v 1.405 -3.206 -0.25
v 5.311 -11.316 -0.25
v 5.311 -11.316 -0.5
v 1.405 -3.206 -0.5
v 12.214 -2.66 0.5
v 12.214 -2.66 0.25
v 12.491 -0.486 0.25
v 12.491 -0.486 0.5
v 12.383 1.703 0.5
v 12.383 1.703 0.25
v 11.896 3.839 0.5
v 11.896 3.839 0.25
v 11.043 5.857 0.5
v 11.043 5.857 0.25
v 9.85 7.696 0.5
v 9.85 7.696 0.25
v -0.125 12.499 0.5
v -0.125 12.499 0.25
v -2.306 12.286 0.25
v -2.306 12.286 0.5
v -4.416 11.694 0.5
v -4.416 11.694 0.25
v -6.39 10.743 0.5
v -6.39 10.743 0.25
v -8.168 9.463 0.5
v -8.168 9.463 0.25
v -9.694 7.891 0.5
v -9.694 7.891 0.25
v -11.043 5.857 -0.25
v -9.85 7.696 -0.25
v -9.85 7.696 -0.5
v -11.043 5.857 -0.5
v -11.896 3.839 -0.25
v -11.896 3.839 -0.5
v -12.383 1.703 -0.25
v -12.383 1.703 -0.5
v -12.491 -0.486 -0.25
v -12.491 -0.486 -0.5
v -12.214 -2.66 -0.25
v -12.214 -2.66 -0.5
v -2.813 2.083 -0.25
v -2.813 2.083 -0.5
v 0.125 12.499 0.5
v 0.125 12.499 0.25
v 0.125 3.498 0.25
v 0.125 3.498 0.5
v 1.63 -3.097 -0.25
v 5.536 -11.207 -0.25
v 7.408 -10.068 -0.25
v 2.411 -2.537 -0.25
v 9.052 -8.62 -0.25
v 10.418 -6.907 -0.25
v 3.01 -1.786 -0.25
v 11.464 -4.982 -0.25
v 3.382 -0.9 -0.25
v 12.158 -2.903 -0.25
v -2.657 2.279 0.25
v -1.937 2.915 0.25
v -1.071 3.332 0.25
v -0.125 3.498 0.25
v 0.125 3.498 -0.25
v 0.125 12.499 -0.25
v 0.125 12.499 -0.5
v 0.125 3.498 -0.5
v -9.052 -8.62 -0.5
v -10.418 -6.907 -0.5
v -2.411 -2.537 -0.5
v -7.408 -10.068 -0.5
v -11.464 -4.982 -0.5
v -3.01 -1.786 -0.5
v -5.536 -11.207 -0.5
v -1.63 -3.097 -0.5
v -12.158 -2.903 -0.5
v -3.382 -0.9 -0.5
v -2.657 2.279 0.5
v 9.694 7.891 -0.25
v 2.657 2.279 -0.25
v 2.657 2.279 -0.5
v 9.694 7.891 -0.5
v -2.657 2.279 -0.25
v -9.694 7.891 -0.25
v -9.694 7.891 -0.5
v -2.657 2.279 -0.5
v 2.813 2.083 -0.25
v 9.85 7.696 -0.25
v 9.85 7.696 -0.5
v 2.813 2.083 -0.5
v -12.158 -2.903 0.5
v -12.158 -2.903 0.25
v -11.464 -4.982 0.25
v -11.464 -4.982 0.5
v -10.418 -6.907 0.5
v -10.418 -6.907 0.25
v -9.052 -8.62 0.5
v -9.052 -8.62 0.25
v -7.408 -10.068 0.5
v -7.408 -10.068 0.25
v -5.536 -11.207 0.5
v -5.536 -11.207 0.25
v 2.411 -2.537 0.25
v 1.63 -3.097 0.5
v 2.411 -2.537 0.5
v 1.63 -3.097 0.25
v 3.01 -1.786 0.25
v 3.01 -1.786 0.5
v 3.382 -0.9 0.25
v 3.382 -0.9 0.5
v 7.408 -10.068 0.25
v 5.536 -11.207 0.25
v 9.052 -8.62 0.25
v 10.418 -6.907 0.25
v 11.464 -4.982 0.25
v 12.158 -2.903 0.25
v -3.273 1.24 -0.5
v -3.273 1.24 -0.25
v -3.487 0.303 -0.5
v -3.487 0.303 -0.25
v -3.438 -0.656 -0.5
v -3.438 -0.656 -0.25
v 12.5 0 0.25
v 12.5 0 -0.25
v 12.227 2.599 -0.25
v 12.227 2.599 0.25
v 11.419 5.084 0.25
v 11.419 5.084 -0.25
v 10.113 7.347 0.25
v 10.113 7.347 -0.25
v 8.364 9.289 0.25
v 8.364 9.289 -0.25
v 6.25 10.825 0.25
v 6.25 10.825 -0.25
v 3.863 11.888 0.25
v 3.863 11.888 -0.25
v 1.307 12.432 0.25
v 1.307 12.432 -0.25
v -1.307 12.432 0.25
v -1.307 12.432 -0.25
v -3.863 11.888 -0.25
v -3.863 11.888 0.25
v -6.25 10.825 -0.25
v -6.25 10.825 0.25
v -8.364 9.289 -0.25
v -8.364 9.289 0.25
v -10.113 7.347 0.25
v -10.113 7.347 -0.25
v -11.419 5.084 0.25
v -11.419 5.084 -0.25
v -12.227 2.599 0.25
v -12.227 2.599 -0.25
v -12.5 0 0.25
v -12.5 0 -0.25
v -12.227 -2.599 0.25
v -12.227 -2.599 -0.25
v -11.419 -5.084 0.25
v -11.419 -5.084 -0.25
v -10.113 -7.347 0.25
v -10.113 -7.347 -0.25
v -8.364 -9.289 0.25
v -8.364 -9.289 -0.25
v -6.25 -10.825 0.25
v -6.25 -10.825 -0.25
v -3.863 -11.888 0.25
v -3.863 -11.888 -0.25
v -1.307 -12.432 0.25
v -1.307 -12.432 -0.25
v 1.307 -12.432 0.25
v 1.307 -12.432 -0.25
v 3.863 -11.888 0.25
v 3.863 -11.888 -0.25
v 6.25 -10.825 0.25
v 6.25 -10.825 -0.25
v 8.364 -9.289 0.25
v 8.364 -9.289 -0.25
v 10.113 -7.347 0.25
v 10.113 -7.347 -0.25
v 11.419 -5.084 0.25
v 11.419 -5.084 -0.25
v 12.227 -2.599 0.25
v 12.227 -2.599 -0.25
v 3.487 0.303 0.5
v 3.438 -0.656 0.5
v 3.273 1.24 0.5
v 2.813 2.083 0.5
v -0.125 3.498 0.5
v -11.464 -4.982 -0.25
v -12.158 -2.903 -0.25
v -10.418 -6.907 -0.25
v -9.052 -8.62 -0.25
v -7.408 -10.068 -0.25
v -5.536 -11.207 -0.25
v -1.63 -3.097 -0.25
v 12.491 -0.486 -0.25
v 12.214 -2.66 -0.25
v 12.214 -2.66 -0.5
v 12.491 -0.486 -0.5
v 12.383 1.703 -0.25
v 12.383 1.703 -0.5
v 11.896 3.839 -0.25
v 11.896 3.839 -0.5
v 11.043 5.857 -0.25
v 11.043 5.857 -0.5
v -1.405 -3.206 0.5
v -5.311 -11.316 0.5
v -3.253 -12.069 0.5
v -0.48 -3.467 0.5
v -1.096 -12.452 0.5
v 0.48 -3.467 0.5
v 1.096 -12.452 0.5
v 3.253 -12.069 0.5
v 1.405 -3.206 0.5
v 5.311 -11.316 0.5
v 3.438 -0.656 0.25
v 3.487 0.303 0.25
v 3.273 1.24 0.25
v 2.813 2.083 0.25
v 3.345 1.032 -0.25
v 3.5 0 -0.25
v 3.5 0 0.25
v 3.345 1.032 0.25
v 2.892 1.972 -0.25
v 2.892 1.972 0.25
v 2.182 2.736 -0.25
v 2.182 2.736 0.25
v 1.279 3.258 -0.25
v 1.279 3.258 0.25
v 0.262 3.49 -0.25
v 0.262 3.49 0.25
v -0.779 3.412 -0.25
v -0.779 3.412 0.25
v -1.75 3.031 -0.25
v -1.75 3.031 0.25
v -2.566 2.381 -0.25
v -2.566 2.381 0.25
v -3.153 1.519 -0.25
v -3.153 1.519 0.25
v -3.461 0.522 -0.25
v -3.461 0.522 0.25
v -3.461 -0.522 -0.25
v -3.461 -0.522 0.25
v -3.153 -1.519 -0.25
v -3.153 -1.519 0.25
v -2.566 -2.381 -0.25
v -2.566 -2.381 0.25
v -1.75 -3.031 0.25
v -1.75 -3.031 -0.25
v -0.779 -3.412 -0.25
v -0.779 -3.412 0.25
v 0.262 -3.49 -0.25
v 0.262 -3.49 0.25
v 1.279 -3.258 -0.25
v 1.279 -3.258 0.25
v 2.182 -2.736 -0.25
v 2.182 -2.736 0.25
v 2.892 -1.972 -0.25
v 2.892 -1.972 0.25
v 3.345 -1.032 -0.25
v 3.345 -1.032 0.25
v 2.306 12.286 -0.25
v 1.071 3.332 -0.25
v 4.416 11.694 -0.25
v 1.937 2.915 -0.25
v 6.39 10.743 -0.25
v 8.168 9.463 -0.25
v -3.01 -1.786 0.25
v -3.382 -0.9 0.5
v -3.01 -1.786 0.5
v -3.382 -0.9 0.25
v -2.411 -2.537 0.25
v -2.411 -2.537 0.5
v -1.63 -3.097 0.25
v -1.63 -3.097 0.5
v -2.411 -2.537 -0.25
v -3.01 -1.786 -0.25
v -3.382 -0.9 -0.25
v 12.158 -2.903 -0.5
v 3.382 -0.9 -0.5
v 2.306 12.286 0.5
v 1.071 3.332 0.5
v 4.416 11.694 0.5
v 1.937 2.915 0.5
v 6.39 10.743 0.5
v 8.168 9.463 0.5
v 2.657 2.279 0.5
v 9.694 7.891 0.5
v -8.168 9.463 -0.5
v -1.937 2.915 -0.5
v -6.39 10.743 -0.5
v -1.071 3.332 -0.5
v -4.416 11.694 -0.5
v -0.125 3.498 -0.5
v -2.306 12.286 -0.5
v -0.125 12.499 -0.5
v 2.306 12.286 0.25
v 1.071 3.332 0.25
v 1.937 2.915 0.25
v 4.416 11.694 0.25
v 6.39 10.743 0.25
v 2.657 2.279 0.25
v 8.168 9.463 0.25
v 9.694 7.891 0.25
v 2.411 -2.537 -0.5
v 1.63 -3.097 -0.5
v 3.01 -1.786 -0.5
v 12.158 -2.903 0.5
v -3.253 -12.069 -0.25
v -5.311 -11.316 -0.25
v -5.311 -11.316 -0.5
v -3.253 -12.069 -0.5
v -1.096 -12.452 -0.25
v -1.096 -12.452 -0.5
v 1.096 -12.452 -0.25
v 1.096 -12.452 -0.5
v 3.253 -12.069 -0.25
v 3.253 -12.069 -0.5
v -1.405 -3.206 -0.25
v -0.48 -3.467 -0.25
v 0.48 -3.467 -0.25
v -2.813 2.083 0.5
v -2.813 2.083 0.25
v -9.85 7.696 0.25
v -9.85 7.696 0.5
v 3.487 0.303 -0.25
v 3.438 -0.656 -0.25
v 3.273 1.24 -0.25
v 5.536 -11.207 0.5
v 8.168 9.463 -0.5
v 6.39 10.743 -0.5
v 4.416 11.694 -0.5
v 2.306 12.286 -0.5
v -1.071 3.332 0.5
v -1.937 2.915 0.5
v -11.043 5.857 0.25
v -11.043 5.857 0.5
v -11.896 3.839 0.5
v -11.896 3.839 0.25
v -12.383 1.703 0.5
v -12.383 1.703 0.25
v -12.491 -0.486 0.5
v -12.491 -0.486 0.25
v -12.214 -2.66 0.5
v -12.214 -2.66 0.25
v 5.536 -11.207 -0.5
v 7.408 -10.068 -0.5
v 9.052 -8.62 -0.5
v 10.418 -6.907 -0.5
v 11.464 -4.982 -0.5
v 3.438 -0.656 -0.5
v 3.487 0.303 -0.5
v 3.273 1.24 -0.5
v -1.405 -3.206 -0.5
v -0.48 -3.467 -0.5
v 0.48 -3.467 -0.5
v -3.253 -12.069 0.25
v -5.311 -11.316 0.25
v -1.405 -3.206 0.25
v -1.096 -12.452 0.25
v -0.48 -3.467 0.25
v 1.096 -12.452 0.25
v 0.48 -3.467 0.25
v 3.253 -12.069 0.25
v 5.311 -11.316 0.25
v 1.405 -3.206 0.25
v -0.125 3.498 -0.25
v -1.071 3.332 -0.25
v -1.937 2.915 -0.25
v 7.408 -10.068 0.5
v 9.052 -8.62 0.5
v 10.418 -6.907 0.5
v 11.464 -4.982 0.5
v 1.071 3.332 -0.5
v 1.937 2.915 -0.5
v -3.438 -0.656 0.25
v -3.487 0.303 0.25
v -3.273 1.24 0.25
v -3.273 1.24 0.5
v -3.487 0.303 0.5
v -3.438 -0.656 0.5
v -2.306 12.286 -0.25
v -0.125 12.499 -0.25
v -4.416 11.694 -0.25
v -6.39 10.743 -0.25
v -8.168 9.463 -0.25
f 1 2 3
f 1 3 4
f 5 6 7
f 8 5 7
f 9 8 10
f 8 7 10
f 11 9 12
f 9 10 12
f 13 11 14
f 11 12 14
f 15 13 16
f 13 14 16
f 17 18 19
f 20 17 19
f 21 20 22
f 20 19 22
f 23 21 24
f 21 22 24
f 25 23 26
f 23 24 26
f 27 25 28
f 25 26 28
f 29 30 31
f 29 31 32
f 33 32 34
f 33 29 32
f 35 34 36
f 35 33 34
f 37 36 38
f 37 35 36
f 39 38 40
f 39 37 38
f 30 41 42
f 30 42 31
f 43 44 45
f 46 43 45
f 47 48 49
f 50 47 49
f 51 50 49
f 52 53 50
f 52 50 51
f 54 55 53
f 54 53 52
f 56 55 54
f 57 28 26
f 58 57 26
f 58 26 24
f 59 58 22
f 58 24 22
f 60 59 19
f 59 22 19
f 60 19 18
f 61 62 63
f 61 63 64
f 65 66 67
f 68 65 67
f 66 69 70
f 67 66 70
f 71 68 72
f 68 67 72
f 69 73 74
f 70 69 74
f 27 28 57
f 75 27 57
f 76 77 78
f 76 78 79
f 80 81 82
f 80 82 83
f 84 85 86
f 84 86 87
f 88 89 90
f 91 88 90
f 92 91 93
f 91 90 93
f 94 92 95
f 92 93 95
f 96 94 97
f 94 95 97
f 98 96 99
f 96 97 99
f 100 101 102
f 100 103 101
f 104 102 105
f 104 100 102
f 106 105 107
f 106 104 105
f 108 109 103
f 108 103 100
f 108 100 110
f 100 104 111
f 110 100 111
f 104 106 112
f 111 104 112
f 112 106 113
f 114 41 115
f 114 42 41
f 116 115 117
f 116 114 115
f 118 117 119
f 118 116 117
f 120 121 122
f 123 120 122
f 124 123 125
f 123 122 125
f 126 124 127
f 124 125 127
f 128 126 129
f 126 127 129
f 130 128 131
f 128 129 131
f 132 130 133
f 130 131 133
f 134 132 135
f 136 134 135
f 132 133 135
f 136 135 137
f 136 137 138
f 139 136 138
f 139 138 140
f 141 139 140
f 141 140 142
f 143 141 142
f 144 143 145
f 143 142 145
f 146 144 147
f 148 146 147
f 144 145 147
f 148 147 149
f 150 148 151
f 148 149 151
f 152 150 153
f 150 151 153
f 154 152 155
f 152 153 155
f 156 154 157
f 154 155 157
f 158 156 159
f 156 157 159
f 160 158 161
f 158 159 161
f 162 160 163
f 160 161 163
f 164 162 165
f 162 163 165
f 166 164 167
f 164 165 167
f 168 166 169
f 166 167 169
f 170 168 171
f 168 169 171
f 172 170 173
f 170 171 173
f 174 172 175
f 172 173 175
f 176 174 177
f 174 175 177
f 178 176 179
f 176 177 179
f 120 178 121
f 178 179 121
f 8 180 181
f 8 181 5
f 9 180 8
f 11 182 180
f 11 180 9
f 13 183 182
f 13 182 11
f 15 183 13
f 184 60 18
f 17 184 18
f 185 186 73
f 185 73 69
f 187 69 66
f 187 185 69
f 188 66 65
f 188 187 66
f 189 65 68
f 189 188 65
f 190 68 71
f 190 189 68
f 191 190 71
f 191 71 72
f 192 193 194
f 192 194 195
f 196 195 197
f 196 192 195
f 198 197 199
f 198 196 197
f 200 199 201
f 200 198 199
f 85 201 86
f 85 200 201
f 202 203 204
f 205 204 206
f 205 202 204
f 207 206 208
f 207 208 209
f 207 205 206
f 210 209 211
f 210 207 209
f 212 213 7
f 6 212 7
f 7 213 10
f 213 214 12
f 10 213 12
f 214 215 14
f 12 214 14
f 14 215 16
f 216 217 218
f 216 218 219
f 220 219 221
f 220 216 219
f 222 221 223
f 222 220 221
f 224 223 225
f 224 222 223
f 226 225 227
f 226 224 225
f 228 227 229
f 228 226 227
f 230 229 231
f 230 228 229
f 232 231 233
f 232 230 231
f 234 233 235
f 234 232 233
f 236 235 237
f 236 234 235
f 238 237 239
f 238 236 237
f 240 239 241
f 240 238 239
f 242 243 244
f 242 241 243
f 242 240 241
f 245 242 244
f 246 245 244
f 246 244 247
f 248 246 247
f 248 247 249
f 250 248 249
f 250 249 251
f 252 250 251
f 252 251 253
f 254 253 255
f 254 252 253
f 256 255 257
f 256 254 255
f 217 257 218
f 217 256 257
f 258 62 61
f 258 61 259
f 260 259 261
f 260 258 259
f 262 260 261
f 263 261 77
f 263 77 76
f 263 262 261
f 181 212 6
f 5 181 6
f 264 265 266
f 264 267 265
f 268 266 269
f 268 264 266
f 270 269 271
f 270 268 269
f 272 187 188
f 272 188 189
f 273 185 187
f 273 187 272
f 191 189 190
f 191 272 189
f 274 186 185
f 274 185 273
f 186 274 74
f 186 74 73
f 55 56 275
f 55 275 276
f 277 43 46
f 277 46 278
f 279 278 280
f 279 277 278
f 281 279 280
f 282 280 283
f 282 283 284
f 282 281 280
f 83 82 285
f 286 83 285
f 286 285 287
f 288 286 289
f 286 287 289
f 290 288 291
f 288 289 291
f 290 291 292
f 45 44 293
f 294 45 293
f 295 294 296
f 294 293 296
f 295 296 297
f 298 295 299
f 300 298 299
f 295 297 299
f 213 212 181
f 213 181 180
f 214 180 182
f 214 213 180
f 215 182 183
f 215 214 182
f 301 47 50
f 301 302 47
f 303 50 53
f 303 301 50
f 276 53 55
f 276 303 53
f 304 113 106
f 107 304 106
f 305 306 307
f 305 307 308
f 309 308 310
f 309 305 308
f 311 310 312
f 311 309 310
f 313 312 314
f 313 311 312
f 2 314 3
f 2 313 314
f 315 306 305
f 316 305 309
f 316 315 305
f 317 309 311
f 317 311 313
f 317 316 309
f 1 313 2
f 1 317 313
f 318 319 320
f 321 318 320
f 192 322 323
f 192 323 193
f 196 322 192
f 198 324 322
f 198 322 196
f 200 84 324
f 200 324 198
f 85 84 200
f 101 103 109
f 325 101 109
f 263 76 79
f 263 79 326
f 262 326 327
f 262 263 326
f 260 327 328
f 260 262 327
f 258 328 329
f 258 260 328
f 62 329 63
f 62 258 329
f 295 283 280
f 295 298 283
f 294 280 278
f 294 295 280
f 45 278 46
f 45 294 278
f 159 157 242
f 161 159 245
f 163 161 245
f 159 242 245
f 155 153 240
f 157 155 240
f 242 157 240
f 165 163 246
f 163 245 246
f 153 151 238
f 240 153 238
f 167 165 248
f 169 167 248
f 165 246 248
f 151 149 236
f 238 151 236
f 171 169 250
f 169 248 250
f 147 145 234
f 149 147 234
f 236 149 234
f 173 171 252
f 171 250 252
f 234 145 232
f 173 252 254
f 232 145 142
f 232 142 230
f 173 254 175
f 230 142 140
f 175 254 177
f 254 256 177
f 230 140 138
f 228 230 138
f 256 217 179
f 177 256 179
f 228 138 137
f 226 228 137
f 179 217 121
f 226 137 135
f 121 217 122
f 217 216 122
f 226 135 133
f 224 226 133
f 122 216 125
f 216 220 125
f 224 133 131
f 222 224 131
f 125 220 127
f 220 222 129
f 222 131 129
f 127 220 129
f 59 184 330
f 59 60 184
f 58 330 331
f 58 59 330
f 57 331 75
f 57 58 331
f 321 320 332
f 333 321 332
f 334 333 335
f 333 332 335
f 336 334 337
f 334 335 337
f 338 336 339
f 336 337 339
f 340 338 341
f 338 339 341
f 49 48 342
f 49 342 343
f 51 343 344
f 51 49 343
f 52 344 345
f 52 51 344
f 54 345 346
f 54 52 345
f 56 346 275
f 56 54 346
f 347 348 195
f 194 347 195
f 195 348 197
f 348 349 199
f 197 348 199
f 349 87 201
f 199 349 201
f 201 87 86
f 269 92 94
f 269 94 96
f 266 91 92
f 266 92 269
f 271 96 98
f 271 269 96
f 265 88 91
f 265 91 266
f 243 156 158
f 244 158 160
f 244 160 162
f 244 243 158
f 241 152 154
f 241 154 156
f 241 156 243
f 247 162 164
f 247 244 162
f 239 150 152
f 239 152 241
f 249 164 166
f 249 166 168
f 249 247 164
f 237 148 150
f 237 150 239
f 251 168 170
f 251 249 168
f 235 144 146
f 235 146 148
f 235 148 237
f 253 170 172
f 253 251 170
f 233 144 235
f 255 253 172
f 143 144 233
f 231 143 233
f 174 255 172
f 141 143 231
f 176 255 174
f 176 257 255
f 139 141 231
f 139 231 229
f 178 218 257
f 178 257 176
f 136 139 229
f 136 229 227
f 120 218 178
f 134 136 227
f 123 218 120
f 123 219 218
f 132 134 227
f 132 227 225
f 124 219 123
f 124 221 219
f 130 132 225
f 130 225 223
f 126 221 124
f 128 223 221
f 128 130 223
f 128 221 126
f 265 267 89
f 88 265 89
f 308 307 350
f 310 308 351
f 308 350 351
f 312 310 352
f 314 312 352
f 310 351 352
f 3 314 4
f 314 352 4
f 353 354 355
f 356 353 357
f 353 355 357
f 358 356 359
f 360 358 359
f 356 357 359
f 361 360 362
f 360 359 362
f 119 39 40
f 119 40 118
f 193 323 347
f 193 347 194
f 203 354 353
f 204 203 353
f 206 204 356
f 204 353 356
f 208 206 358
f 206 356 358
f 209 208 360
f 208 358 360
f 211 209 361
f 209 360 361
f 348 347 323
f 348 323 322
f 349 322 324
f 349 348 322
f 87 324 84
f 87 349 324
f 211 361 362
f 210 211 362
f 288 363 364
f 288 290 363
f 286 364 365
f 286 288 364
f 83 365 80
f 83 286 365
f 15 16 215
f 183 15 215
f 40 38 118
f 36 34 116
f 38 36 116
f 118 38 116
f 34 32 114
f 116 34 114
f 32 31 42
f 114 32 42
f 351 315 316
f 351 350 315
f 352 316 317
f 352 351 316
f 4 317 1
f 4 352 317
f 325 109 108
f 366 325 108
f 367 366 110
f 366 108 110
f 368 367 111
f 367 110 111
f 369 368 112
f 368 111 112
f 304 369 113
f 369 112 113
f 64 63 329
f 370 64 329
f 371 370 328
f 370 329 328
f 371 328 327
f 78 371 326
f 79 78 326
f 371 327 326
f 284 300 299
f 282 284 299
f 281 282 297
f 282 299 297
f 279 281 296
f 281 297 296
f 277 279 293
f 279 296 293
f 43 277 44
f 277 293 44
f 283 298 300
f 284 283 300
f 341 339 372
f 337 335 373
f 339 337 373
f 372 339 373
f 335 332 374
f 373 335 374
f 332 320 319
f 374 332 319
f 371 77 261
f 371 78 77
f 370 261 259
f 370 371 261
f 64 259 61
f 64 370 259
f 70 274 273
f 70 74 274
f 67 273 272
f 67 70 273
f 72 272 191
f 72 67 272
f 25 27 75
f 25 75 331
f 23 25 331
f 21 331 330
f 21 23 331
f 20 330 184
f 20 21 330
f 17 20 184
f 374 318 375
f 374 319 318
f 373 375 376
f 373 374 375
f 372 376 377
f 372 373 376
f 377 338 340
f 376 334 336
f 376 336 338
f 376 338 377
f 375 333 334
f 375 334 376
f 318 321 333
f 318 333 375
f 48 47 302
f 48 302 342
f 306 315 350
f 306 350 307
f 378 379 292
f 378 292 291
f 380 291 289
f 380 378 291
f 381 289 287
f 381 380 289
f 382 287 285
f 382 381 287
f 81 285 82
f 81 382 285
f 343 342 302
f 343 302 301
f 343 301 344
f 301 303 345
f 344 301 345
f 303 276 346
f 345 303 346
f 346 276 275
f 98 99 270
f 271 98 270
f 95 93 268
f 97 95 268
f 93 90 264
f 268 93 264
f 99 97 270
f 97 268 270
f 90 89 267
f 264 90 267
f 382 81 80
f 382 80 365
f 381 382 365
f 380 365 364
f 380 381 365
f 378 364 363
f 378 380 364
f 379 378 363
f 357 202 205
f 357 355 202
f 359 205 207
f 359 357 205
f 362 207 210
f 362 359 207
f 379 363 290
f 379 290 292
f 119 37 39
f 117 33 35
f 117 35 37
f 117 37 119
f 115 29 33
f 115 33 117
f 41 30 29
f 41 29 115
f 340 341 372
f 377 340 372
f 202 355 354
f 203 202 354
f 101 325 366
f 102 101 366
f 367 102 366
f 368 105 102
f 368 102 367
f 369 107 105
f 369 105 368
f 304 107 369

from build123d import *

# Parameters (mm, degrees)
BOSS_EXTRUDE1_DEPTH      = 0.25
BOSS_EXTRUDE1_DEPTH_BACK = 0.25
SKETCH1_R                = 12.5
BOSS_EXTRUDE2_DEPTH      = 0.25
BOSS_EXTRUDE2_2_DEPTH    = 0.25
BOSS_EXTRUDE2_3_DEPTH    = 0.25
BOSS_EXTRUDE2_4_DEPTH    = 0.25
BOSS_EXTRUDE2_5_DEPTH    = 0.25
BOSS_EXTRUDE2_6_DEPTH    = 0.25
BOSS_EXTRUDE2_7_DEPTH    = 0.25
CUT_EXTRUDE2_DEPTH       = 10
CUT_EXTRUDE2_DEPTH_BACK  = 8.35
SKETCH3_R                = 3.5


with BuildPart() as part:
    # Sketch1 → Boss-Extrude1 (new, two sides: drawn at the far end of the back side and taken through both)
    with BuildSketch(Plane.XY.offset(-BOSS_EXTRUDE1_DEPTH_BACK)):
        Circle(SKETCH1_R)
    extrude(amount=BOSS_EXTRUDE1_DEPTH + BOSS_EXTRUDE1_DEPTH_BACK)


with BuildPart() as body_2:
    # Sketch2 → Boss-Extrude2 (new body)
    with BuildSketch(Plane.XY.offset(0.25)):
        with BuildLine():
            Line((0.125, 12.499374984), (0.125, 0.259565175))
            Line((0.125, 0.259565175), (9.694468649, 7.890961768))
            ThreePointArc((9.694468649, 7.890961768), (5.423546739, 11.262110849), (0.125, 12.499374984))
        make_face()
    extrude(amount=BOSS_EXTRUDE2_DEPTH)


with BuildPart() as body_3:
    # Sketch2 → Boss-Extrude2 2 (new body)
    with BuildSketch(Plane.XY.offset(0.25)):
        with BuildLine():
            Line((-9.694468649, 7.890961768), (-0.125, 0.259565175))
            Line((-0.125, 0.259565175), (-0.125, 12.499374984))
            ThreePointArc((-0.125, 12.499374984), (-5.423546739, 11.262110849), (-9.694468649, 7.890961768))
        make_face()
    extrude(amount=BOSS_EXTRUDE2_2_DEPTH)


with BuildPart() as body_4:
    # Sketch2 → Boss-Extrude2 3 (new body)
    with BuildSketch(Plane.XY.offset(0.25)):
        with BuildLine():
            Line((-12.213804674, -2.659506606), (-0.28087245, 0.064107304))
            Line((-0.28087245, 0.064107304), (-9.850341099, 7.695503897))
            ThreePointArc((-9.850341099, 7.695503897), (-12.186598902, 2.781511674), (-12.213804674, -2.659506606))
        make_face()
    extrude(amount=BOSS_EXTRUDE2_3_DEPTH)


with BuildPart() as body_5:
    # Sketch2 → Boss-Extrude2 4 (new body)
    with BuildSketch(Plane.XY.offset(0.25)):
        with BuildLine():
            Line((9.850341099, 7.695503897), (0.28087245, 0.064107304))
            Line((0.28087245, 0.064107304), (12.213804674, -2.659506606))
            ThreePointArc((12.213804674, -2.659506606), (12.186598902, 2.781511674), (9.850341099, 7.695503897))
        make_face()
    extrude(amount=BOSS_EXTRUDE2_4_DEPTH)


with BuildPart() as body_6:
    # Sketch2 → Boss-Extrude2 5 (new body)
    with BuildSketch(Plane.XY.offset(0.25)):
        with BuildLine():
            Line((12.15817444, -2.903238584), (0.225242217, -0.179624674))
            Line((0.225242217, -0.179624674), (5.535896663, -11.207312262))
            ThreePointArc((5.535896663, -11.207312262), (9.772893531, -7.793622523), (12.15817444, -2.903238584))
        make_face()
    extrude(amount=BOSS_EXTRUDE2_5_DEPTH)


with BuildPart() as body_7:
    # Sketch2 → Boss-Extrude2 6 (new body)
    with BuildSketch(Plane.XY.offset(0.25)):
        with BuildLine():
            Line((5.310654446, -11.315783197), (0, -0.288095609))
            Line((0, -0.288095609), (-5.310654446, -11.315783197))
            ThreePointArc((-5.310654446, -11.315783197), (0, -12.5), (5.310654446, -11.315783197))
        make_face()
    extrude(amount=BOSS_EXTRUDE2_6_DEPTH)


with BuildPart() as body_8:
    # Sketch2 → Boss-Extrude2 7 (new body)
    with BuildSketch(Plane.XY.offset(0.25)):
        with BuildLine():
            Line((-5.535896663, -11.207312262), (-0.225242217, -0.179624674))
            Line((-0.225242217, -0.179624674), (-12.15817444, -2.903238584))
            ThreePointArc((-12.15817444, -2.903238584), (-9.772893531, -7.793622523), (-5.535896663, -11.207312262))
        make_face()
    extrude(amount=BOSS_EXTRUDE2_7_DEPTH)


with BuildPart() as body_9:
    # Mirror5: mirrored copy
    add(body_2.part.mirror(Plane.XY))


with BuildPart() as body_10:
    # Mirror5 2: mirrored copy
    add(body_3.part.mirror(Plane.XY))


with BuildPart() as body_11:
    # Mirror5 3: mirrored copy
    add(body_5.part.mirror(Plane.XY))


with BuildPart() as body_12:
    # Mirror5 4: mirrored copy
    add(body_6.part.mirror(Plane.XY))


with BuildPart() as body_13:
    # Mirror5 5: mirrored copy
    add(body_7.part.mirror(Plane.XY))


with BuildPart() as body_14:
    # Mirror5 6: mirrored copy
    add(body_8.part.mirror(Plane.XY))


with BuildPart() as body_15:
    # Mirror5 7: mirrored copy
    add(body_4.part.mirror(Plane.XY))


with BuildPart() as cut_extrude2_tool:
    # Sketch3 → Cut-Extrude2 (new, two sides: drawn at the far end of the back side and taken through both)
    with BuildSketch(Plane.XY.offset(-CUT_EXTRUDE2_DEPTH_BACK)):
        Circle(SKETCH3_R)
    extrude(amount=CUT_EXTRUDE2_DEPTH + CUT_EXTRUDE2_DEPTH_BACK)


with BuildPart() as part_1:
    add(part.part)

    # Cut-Extrude2: cut by cut_extrude2_tool
    add(cut_extrude2_tool.part, mode=Mode.SUBTRACT)


with BuildPart() as body_2_1:
    add(body_2.part)

    # Cut-Extrude2: cut by cut_extrude2_tool
    add(cut_extrude2_tool.part, mode=Mode.SUBTRACT)


with BuildPart() as body_3_1:
    add(body_3.part)

    # Cut-Extrude2: cut by cut_extrude2_tool
    add(cut_extrude2_tool.part, mode=Mode.SUBTRACT)


with BuildPart() as body_4_1:
    add(body_4.part)

    # Cut-Extrude2: cut by cut_extrude2_tool
    add(cut_extrude2_tool.part, mode=Mode.SUBTRACT)


with BuildPart() as body_5_1:
    add(body_5.part)

    # Cut-Extrude2: cut by cut_extrude2_tool
    add(cut_extrude2_tool.part, mode=Mode.SUBTRACT)


with BuildPart() as body_6_1:
    add(body_6.part)

    # Cut-Extrude2: cut by cut_extrude2_tool
    add(cut_extrude2_tool.part, mode=Mode.SUBTRACT)


with BuildPart() as body_7_1:
    add(body_7.part)

    # Cut-Extrude2: cut by cut_extrude2_tool
    add(cut_extrude2_tool.part, mode=Mode.SUBTRACT)


with BuildPart() as body_8_1:
    add(body_8.part)

    # Cut-Extrude2: cut by cut_extrude2_tool
    add(cut_extrude2_tool.part, mode=Mode.SUBTRACT)


with BuildPart() as body_9_1:
    add(body_9.part)

    # Cut-Extrude2: cut by cut_extrude2_tool
    add(cut_extrude2_tool.part, mode=Mode.SUBTRACT)


with BuildPart() as body_10_1:
    add(body_10.part)

    # Cut-Extrude2: cut by cut_extrude2_tool
    add(cut_extrude2_tool.part, mode=Mode.SUBTRACT)


with BuildPart() as body_11_1:
    add(body_11.part)

    # Cut-Extrude2: cut by cut_extrude2_tool
    add(cut_extrude2_tool.part, mode=Mode.SUBTRACT)


with BuildPart() as body_12_1:
    add(body_12.part)

    # Cut-Extrude2: cut by cut_extrude2_tool
    add(cut_extrude2_tool.part, mode=Mode.SUBTRACT)


with BuildPart() as body_13_1:
    add(body_13.part)

    # Cut-Extrude2: cut by cut_extrude2_tool
    add(cut_extrude2_tool.part, mode=Mode.SUBTRACT)


with BuildPart() as body_14_1:
    add(body_14.part)

    # Cut-Extrude2: cut by cut_extrude2_tool
    add(cut_extrude2_tool.part, mode=Mode.SUBTRACT)


with BuildPart() as body_15_1:
    add(body_15.part)

    # Cut-Extrude2: cut by cut_extrude2_tool
    add(cut_extrude2_tool.part, mode=Mode.SUBTRACT)


solid = Compound([part_1.part, body_2_1.part, body_3_1.part, body_4_1.part, body_5_1.part, body_6_1.part, body_7_1.part, body_8_1.part, body_9_1.part, body_10_1.part, body_11_1.part, body_12_1.part, body_13_1.part, body_14_1.part, body_15_1.part])
